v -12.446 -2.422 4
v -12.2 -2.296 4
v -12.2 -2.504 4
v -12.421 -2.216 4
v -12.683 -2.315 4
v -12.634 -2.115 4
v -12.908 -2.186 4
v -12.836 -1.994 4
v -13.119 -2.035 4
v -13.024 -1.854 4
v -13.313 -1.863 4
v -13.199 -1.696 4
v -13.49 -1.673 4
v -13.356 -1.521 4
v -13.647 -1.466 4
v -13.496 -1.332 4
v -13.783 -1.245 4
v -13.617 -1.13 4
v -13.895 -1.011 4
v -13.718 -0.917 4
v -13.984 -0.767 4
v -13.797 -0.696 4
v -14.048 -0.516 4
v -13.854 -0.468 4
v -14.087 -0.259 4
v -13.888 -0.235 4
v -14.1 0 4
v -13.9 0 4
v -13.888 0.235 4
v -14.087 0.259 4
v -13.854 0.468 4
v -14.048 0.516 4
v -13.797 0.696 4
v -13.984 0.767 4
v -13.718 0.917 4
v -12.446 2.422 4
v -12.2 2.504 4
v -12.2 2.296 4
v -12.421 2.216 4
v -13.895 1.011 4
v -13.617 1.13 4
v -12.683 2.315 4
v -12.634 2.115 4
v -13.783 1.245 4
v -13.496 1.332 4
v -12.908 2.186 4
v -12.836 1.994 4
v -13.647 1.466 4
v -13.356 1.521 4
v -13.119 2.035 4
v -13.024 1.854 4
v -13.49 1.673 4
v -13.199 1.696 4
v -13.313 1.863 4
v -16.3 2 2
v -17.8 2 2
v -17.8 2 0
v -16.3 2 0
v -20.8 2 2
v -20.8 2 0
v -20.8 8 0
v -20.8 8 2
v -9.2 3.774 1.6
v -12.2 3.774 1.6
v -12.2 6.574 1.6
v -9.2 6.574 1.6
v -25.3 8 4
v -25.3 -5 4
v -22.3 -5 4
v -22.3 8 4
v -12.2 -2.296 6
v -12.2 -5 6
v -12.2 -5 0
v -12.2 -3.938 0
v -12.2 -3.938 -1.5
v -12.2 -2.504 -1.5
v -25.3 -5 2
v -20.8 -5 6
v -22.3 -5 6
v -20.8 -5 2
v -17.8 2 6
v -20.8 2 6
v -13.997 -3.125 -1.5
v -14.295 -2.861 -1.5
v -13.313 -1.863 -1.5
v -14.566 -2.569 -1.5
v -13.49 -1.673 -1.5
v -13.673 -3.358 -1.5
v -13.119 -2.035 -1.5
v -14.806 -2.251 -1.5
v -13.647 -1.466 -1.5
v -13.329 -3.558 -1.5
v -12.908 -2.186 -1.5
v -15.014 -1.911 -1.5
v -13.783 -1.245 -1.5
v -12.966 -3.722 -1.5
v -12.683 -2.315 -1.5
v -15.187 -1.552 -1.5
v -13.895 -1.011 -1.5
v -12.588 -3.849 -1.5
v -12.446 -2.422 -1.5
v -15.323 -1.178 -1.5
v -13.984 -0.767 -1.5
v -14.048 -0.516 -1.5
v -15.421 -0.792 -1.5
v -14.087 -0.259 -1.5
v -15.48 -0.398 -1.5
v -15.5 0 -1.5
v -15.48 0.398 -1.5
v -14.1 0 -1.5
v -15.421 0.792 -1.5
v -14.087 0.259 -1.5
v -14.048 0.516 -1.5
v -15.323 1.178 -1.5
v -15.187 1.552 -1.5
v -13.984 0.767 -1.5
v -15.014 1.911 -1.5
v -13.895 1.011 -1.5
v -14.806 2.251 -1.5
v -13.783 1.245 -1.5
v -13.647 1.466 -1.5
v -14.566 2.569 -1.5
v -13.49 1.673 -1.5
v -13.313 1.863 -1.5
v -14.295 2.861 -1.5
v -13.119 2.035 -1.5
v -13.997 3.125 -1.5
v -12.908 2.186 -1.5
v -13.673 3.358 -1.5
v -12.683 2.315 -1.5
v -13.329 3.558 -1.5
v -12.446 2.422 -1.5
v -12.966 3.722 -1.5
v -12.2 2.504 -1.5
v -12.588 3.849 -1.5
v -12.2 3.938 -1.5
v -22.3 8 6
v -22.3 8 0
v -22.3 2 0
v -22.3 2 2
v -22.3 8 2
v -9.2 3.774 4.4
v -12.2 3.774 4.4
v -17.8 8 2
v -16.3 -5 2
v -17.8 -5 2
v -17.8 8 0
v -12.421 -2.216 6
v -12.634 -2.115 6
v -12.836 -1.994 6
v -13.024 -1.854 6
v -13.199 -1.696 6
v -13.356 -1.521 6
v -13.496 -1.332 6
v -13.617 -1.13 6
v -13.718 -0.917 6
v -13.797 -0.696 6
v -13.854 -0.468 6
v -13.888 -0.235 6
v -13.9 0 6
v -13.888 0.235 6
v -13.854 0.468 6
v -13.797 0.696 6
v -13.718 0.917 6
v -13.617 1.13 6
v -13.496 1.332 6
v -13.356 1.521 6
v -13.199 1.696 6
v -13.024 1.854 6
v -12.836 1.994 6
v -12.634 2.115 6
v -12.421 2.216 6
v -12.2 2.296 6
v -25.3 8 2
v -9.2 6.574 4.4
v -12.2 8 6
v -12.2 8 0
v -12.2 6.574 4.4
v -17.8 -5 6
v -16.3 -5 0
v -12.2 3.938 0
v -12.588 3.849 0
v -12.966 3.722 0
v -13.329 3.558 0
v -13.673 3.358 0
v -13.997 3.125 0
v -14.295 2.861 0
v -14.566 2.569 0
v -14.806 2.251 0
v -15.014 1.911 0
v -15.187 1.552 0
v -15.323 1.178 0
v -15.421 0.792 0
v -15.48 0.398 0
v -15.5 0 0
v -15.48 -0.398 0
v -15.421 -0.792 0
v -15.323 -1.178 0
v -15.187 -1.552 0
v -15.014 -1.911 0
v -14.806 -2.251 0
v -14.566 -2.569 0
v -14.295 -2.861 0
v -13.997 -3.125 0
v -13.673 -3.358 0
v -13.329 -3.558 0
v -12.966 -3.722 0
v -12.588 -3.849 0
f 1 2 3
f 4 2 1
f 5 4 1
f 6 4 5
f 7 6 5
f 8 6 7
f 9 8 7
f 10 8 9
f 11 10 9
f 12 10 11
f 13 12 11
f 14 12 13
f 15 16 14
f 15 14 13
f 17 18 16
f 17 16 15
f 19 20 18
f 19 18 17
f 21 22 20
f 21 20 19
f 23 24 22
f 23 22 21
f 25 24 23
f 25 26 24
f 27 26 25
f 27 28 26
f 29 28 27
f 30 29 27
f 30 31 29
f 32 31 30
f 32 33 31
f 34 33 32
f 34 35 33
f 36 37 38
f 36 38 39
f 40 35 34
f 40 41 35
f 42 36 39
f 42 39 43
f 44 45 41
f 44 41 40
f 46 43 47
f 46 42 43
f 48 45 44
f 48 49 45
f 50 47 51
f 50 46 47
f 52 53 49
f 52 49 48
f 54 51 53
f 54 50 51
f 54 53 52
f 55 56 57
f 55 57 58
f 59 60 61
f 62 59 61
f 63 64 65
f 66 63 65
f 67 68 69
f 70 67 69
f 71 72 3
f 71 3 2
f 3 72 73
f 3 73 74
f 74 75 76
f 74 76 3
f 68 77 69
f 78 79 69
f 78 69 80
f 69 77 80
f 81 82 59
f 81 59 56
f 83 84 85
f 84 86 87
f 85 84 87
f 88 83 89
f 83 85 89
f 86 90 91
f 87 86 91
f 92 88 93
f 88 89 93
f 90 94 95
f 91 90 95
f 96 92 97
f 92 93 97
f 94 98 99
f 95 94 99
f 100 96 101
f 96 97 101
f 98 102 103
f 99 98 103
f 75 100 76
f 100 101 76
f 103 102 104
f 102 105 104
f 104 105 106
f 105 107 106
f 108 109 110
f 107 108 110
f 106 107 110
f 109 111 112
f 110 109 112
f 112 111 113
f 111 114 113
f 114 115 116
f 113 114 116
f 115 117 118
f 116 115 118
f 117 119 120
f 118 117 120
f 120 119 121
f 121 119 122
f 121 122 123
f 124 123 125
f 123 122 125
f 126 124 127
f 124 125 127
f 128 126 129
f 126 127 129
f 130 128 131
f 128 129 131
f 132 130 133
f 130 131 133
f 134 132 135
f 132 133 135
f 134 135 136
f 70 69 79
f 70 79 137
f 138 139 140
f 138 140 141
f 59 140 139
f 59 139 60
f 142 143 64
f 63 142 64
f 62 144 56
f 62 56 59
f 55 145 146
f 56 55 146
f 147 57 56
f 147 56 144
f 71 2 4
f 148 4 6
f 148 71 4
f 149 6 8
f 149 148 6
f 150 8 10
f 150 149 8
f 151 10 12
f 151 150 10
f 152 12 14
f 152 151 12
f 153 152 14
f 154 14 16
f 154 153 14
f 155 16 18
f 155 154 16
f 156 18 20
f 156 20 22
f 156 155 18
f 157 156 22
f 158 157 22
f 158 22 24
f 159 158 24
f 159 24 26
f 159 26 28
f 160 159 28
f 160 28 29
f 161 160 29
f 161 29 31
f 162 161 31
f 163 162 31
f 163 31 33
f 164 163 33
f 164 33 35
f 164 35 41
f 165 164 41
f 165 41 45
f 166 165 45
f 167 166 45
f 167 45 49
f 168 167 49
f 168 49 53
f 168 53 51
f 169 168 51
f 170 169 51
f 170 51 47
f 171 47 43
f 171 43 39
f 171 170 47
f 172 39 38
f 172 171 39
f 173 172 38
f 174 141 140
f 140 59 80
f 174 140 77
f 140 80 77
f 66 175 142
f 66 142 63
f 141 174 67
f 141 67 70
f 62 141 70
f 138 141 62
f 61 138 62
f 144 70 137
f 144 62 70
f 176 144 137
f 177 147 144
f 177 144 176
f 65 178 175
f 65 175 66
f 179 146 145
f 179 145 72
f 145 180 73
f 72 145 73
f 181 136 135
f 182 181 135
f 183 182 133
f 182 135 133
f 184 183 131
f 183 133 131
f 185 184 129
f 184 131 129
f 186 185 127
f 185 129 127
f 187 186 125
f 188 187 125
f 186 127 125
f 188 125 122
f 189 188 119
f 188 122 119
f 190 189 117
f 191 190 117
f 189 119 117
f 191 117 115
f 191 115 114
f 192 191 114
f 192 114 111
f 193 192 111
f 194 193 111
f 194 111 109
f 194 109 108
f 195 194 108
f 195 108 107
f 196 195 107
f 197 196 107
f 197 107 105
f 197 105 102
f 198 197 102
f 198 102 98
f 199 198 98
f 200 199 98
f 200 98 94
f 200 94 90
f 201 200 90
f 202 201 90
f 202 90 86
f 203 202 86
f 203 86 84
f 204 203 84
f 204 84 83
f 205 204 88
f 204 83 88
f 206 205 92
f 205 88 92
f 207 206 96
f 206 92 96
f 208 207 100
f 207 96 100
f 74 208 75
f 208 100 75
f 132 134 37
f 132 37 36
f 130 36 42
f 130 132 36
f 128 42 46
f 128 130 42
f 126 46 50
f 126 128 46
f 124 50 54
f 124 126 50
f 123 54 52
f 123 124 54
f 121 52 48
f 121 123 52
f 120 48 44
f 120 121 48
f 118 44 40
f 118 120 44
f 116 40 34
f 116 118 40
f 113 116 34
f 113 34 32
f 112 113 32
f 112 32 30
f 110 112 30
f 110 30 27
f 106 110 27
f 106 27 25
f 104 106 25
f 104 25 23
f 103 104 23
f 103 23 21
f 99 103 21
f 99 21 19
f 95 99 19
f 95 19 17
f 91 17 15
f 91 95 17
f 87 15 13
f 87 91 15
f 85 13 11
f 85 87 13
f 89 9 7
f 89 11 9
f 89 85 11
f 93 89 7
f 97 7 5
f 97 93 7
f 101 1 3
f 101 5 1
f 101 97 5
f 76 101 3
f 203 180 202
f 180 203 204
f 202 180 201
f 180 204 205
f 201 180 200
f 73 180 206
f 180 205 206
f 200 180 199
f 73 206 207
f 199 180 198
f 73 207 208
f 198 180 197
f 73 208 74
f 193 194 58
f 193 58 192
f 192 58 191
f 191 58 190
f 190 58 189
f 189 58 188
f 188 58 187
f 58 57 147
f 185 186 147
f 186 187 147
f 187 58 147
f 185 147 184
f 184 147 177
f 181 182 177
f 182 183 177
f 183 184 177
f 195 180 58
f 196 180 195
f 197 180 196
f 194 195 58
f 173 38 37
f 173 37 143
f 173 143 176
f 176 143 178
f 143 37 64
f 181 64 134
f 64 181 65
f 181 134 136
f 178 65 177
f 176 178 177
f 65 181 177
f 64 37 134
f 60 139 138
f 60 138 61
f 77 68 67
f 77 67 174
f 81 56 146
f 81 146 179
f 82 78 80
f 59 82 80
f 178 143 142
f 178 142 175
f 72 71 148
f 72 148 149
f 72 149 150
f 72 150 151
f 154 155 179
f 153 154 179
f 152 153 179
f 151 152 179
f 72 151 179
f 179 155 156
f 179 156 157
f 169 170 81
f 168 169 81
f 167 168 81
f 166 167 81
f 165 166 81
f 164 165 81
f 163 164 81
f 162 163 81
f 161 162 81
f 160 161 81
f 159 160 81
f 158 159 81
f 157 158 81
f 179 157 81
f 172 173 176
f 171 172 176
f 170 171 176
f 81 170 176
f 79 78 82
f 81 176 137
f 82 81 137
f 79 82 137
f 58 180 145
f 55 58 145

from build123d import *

# Parameters (mm, degrees)
SKETCH1_R            = 1
BOSS_EXTRUDE1_DEPTH  = 6
SKETCH2_R            = 2.6
CUT_EXTRUDE1_DEPTH   = 6
SKETCH3_W            = 7.6
SKETCH3_H            = 13
BOSS_EXTRUDE2_DEPTH  = 6
BOSS_EXTRUDE5_START  = -5
SKETCH6_W            = 3
SKETCH6_H            = 2
BOSS_EXTRUDE5_DEPTH  = 13
BOSS_EXTRUDE6_START  = -7.5
SKETCH10_R           = 4
SKETCH10_R_2         = 2.6
BOSS_EXTRUDE6_DEPTH  = 1.5
BOSS_EXTRUDE7_START  = -6
SKETCH12_R           = 2.6
SKETCH12_R_2         = 2.4
BOSS_EXTRUDE7_DEPTH  = 2
CUT_EXTRUDE2_DEPTH   = 7
SKETCH14_W           = 3
SKETCH14_H           = 6
CUT_EXTRUDE3_DEPTH   = 2
SKETCH15_W           = 0.2
SKETCH15_H           = 13
CUT_EXTRUDE5_DEPTH   = 7.5
SKETCH16_W           = 3
SKETCH16_H           = 3
CUT_EXTRUDE6_DEPTH   = 3
SKETCH17_W           = 2.8
SKETCH17_H           = 2.8
BOSS_EXTRUDE9_DEPTH  = 3
BOSS_EXTRUDE10_START = 24.4
SKETCH17_2_W         = 2.8
SKETCH17_2_H         = 2.8
BOSS_EXTRUDE10_DEPTH = 3
SKETCH18_W           = 29.7
SKETCH18_H           = 13
CUT_EXTRUDE11_DEPTH  = 9
SKETCH21_W           = 2.8
SKETCH21_H           = 2.8
BOSS_EXTRUDE12_DEPTH = 3


with BuildPart() as part:
    # Sketch1 → Boss-Extrude1 (new body)
    with BuildSketch(Plane.XY):
        with BuildLine():
            ThreePointArc((3.75, -5), (4.47902769, -4.358991965), (5.1, -3.61282438))
            Line((5.1, -3.61282438), (5.1, 3.61282438))
            ThreePointArc((5.1, 3.61282438), (0, 6.25), (-5.1, 3.61282438))
            Line((-5.1, 3.61282438), (-5.1, -3.61282438))
            ThreePointArc((-5.1, -3.61282438), (-4.47902769, -4.358991965), (-3.75, -5))
            Line((-3.75, -5), (-14.7, -5))
            Line((-14.7, -5), (-14.7, 8))
            Line((-14.7, 8), (14.7, 8))
            Line((14.7, 8), (14.7, -5))
            Line((14.7, -5), (3.75, -5))
        make_face()
        with Locations((11.5, 0)):
            Circle(SKETCH1_R, mode=Mode.SUBTRACT)
        with Locations((-11.5, 0)):
            Circle(SKETCH1_R, mode=Mode.SUBTRACT)
    extrude(amount=BOSS_EXTRUDE1_DEPTH)

    # Sketch2 → Cut-Extrude1 (cut)
    with BuildSketch(Plane.XY):
        with Locations((-11.5, 0)):
            Circle(SKETCH2_R)
        with Locations((11.5, 0)):
            Circle(SKETCH2_R)
    extrude(amount=CUT_EXTRUDE1_DEPTH, mode=Mode.SUBTRACT)

    # Sketch3 → Boss-Extrude2 (add)
    with BuildSketch(Plane.XY):
        with Locations((-18.5, 1.5)):
            Rectangle(SKETCH3_W, SKETCH3_H)
    extrude(amount=BOSS_EXTRUDE2_DEPTH)

    # Sketch6 → Boss-Extrude5 (add)
    with BuildSketch(Plane(origin=(0, 0, 0), x_dir=(1, 0, 0), z_dir=(0, 1, 0)).offset(BOSS_EXTRUDE5_START)):
        with Locations((-23.8, -3)):
            Rectangle(SKETCH6_W, SKETCH6_H)
        with Locations((16.2, -3)):
            Rectangle(SKETCH6_W, SKETCH6_H)
    extrude(amount=BOSS_EXTRUDE5_DEPTH)

    # Sketch10 → Boss-Extrude6 (add)
    with BuildSketch(Plane.XY.offset(6).offset(BOSS_EXTRUDE6_START)):
        with Locations((-11.5, 0)):
            Circle(SKETCH10_R)
        with Locations((-11.5, 0)):
            Circle(SKETCH10_R_2, mode=Mode.SUBTRACT)
        with BuildLine():
            Line((14.7, 2.4), (14.7, -2.4))
            ThreePointArc((14.7, -2.4), (7.5, 0), (14.7, 2.4))
        make_face()
        with Locations((11.5, 0)):
            Circle(SKETCH10_R_2, mode=Mode.SUBTRACT)
    extrude(amount=BOSS_EXTRUDE6_DEPTH)

    # Sketch12 → Boss-Extrude7 (add)
    with BuildSketch(Plane(origin=(0, 0, 0), x_dir=(-1, 0, 0), z_dir=(0, 0, -1)).offset(BOSS_EXTRUDE7_START)):
        with Locations((11.5, 0)):
            Circle(SKETCH12_R)
        with Locations((11.5, 0)):
            Circle(SKETCH12_R_2, mode=Mode.SUBTRACT)
        with Locations((-11.5, 0)):
            Circle(SKETCH12_R)
        with Locations((-11.5, 0)):
            Circle(SKETCH12_R_2, mode=Mode.SUBTRACT)
    extrude(amount=BOSS_EXTRUDE7_DEPTH)

    # Sketch13 → Cut-Extrude2 (cut)
    with BuildSketch(Plane.XZ.offset(5)):
        Polygon((-22.3, 0), (-16.3, 0), (-16.3, 2), (-17.8, 2), (-17.8, 6), (-20.8, 6), (-20.8, 2), (-22.3, 2), align=None)
    extrude(amount=-CUT_EXTRUDE2_DEPTH, mode=Mode.SUBTRACT)

    # Sketch14 → Cut-Extrude3 (cut)
    with BuildSketch(Plane(origin=(0, 0, 0), x_dir=(-1, 0, 0), z_dir=(0, 0, -1))):
        with Locations((19.3, 5)):
            Rectangle(SKETCH14_W, SKETCH14_H)
    extrude(amount=-CUT_EXTRUDE3_DEPTH, mode=Mode.SUBTRACT)

    # Sketch15 → Cut-Extrude5 (cut, symmetric)
    with BuildSketch(Plane.XY):
        with Locations((-12.1, 1.5)):
            Rectangle(SKETCH15_W, SKETCH15_H)
        with Locations((12.1, 1.5)):
            Rectangle(SKETCH15_W, SKETCH15_H)
    extrude(amount=CUT_EXTRUDE5_DEPTH, both=True, mode=Mode.SUBTRACT)

    # Sketch16 → Cut-Extrude6 (cut)
    with BuildSketch(Plane(origin=(12, 0, 0), x_dir=(0, 0, -1), z_dir=(1, 0, 0))):
        with Locations((-3, 5.173669459)):
            Rectangle(SKETCH16_W, SKETCH16_H)
    cut_extrude6 = extrude(amount=-CUT_EXTRUDE6_DEPTH, mode=Mode.SUBTRACT)

    # Mirror1: Cut-Extrude6 across plane
    add(cut_extrude6.mirror(Plane(origin=(0, 0, 0), x_dir=(0, 0, 1), z_dir=(1, 0, 0))), mode=Mode.SUBTRACT)

    # Sketch17 → Boss-Extrude9 (add)
    with BuildSketch(Plane(origin=(-12.2, 0, 0), x_dir=(0, 0, -1), z_dir=(1, 0, 0))):
        with Locations((-3, 5.173669459)):
            Rectangle(SKETCH17_W, SKETCH17_H)
    extrude(amount=BOSS_EXTRUDE9_DEPTH)

    # Sketch17<2> → Boss-Extrude10 (add)
    with BuildSketch(Plane(origin=(-12.2, 0, 0), x_dir=(0, 0, -1), z_dir=(1, 0, 0)).offset(BOSS_EXTRUDE10_START)):
        with Locations((-3, 5.173669459)):
            Rectangle(SKETCH17_2_W, SKETCH17_2_H)
    extrude(amount=-BOSS_EXTRUDE10_DEPTH)

    # Sketch18 → Cut-Extrude11 (cut, symmetric)
    with BuildSketch(Plane.XY):
        with Locations((2.85, 1.5)):
            Rectangle(SKETCH18_W, SKETCH18_H)
    extrude(amount=CUT_EXTRUDE11_DEPTH, both=True, mode=Mode.SUBTRACT)

    # Sketch21 → Boss-Extrude12 (add)
    with BuildSketch(Plane(origin=(-12.2, 0, 0), x_dir=(0, 0, -1), z_dir=(1, 0, 0))):
        with Locations((-3, 5.173669459)):
            Rectangle(SKETCH21_W, SKETCH21_H)
    extrude(amount=BOSS_EXTRUDE12_DEPTH)


solid = part.part
